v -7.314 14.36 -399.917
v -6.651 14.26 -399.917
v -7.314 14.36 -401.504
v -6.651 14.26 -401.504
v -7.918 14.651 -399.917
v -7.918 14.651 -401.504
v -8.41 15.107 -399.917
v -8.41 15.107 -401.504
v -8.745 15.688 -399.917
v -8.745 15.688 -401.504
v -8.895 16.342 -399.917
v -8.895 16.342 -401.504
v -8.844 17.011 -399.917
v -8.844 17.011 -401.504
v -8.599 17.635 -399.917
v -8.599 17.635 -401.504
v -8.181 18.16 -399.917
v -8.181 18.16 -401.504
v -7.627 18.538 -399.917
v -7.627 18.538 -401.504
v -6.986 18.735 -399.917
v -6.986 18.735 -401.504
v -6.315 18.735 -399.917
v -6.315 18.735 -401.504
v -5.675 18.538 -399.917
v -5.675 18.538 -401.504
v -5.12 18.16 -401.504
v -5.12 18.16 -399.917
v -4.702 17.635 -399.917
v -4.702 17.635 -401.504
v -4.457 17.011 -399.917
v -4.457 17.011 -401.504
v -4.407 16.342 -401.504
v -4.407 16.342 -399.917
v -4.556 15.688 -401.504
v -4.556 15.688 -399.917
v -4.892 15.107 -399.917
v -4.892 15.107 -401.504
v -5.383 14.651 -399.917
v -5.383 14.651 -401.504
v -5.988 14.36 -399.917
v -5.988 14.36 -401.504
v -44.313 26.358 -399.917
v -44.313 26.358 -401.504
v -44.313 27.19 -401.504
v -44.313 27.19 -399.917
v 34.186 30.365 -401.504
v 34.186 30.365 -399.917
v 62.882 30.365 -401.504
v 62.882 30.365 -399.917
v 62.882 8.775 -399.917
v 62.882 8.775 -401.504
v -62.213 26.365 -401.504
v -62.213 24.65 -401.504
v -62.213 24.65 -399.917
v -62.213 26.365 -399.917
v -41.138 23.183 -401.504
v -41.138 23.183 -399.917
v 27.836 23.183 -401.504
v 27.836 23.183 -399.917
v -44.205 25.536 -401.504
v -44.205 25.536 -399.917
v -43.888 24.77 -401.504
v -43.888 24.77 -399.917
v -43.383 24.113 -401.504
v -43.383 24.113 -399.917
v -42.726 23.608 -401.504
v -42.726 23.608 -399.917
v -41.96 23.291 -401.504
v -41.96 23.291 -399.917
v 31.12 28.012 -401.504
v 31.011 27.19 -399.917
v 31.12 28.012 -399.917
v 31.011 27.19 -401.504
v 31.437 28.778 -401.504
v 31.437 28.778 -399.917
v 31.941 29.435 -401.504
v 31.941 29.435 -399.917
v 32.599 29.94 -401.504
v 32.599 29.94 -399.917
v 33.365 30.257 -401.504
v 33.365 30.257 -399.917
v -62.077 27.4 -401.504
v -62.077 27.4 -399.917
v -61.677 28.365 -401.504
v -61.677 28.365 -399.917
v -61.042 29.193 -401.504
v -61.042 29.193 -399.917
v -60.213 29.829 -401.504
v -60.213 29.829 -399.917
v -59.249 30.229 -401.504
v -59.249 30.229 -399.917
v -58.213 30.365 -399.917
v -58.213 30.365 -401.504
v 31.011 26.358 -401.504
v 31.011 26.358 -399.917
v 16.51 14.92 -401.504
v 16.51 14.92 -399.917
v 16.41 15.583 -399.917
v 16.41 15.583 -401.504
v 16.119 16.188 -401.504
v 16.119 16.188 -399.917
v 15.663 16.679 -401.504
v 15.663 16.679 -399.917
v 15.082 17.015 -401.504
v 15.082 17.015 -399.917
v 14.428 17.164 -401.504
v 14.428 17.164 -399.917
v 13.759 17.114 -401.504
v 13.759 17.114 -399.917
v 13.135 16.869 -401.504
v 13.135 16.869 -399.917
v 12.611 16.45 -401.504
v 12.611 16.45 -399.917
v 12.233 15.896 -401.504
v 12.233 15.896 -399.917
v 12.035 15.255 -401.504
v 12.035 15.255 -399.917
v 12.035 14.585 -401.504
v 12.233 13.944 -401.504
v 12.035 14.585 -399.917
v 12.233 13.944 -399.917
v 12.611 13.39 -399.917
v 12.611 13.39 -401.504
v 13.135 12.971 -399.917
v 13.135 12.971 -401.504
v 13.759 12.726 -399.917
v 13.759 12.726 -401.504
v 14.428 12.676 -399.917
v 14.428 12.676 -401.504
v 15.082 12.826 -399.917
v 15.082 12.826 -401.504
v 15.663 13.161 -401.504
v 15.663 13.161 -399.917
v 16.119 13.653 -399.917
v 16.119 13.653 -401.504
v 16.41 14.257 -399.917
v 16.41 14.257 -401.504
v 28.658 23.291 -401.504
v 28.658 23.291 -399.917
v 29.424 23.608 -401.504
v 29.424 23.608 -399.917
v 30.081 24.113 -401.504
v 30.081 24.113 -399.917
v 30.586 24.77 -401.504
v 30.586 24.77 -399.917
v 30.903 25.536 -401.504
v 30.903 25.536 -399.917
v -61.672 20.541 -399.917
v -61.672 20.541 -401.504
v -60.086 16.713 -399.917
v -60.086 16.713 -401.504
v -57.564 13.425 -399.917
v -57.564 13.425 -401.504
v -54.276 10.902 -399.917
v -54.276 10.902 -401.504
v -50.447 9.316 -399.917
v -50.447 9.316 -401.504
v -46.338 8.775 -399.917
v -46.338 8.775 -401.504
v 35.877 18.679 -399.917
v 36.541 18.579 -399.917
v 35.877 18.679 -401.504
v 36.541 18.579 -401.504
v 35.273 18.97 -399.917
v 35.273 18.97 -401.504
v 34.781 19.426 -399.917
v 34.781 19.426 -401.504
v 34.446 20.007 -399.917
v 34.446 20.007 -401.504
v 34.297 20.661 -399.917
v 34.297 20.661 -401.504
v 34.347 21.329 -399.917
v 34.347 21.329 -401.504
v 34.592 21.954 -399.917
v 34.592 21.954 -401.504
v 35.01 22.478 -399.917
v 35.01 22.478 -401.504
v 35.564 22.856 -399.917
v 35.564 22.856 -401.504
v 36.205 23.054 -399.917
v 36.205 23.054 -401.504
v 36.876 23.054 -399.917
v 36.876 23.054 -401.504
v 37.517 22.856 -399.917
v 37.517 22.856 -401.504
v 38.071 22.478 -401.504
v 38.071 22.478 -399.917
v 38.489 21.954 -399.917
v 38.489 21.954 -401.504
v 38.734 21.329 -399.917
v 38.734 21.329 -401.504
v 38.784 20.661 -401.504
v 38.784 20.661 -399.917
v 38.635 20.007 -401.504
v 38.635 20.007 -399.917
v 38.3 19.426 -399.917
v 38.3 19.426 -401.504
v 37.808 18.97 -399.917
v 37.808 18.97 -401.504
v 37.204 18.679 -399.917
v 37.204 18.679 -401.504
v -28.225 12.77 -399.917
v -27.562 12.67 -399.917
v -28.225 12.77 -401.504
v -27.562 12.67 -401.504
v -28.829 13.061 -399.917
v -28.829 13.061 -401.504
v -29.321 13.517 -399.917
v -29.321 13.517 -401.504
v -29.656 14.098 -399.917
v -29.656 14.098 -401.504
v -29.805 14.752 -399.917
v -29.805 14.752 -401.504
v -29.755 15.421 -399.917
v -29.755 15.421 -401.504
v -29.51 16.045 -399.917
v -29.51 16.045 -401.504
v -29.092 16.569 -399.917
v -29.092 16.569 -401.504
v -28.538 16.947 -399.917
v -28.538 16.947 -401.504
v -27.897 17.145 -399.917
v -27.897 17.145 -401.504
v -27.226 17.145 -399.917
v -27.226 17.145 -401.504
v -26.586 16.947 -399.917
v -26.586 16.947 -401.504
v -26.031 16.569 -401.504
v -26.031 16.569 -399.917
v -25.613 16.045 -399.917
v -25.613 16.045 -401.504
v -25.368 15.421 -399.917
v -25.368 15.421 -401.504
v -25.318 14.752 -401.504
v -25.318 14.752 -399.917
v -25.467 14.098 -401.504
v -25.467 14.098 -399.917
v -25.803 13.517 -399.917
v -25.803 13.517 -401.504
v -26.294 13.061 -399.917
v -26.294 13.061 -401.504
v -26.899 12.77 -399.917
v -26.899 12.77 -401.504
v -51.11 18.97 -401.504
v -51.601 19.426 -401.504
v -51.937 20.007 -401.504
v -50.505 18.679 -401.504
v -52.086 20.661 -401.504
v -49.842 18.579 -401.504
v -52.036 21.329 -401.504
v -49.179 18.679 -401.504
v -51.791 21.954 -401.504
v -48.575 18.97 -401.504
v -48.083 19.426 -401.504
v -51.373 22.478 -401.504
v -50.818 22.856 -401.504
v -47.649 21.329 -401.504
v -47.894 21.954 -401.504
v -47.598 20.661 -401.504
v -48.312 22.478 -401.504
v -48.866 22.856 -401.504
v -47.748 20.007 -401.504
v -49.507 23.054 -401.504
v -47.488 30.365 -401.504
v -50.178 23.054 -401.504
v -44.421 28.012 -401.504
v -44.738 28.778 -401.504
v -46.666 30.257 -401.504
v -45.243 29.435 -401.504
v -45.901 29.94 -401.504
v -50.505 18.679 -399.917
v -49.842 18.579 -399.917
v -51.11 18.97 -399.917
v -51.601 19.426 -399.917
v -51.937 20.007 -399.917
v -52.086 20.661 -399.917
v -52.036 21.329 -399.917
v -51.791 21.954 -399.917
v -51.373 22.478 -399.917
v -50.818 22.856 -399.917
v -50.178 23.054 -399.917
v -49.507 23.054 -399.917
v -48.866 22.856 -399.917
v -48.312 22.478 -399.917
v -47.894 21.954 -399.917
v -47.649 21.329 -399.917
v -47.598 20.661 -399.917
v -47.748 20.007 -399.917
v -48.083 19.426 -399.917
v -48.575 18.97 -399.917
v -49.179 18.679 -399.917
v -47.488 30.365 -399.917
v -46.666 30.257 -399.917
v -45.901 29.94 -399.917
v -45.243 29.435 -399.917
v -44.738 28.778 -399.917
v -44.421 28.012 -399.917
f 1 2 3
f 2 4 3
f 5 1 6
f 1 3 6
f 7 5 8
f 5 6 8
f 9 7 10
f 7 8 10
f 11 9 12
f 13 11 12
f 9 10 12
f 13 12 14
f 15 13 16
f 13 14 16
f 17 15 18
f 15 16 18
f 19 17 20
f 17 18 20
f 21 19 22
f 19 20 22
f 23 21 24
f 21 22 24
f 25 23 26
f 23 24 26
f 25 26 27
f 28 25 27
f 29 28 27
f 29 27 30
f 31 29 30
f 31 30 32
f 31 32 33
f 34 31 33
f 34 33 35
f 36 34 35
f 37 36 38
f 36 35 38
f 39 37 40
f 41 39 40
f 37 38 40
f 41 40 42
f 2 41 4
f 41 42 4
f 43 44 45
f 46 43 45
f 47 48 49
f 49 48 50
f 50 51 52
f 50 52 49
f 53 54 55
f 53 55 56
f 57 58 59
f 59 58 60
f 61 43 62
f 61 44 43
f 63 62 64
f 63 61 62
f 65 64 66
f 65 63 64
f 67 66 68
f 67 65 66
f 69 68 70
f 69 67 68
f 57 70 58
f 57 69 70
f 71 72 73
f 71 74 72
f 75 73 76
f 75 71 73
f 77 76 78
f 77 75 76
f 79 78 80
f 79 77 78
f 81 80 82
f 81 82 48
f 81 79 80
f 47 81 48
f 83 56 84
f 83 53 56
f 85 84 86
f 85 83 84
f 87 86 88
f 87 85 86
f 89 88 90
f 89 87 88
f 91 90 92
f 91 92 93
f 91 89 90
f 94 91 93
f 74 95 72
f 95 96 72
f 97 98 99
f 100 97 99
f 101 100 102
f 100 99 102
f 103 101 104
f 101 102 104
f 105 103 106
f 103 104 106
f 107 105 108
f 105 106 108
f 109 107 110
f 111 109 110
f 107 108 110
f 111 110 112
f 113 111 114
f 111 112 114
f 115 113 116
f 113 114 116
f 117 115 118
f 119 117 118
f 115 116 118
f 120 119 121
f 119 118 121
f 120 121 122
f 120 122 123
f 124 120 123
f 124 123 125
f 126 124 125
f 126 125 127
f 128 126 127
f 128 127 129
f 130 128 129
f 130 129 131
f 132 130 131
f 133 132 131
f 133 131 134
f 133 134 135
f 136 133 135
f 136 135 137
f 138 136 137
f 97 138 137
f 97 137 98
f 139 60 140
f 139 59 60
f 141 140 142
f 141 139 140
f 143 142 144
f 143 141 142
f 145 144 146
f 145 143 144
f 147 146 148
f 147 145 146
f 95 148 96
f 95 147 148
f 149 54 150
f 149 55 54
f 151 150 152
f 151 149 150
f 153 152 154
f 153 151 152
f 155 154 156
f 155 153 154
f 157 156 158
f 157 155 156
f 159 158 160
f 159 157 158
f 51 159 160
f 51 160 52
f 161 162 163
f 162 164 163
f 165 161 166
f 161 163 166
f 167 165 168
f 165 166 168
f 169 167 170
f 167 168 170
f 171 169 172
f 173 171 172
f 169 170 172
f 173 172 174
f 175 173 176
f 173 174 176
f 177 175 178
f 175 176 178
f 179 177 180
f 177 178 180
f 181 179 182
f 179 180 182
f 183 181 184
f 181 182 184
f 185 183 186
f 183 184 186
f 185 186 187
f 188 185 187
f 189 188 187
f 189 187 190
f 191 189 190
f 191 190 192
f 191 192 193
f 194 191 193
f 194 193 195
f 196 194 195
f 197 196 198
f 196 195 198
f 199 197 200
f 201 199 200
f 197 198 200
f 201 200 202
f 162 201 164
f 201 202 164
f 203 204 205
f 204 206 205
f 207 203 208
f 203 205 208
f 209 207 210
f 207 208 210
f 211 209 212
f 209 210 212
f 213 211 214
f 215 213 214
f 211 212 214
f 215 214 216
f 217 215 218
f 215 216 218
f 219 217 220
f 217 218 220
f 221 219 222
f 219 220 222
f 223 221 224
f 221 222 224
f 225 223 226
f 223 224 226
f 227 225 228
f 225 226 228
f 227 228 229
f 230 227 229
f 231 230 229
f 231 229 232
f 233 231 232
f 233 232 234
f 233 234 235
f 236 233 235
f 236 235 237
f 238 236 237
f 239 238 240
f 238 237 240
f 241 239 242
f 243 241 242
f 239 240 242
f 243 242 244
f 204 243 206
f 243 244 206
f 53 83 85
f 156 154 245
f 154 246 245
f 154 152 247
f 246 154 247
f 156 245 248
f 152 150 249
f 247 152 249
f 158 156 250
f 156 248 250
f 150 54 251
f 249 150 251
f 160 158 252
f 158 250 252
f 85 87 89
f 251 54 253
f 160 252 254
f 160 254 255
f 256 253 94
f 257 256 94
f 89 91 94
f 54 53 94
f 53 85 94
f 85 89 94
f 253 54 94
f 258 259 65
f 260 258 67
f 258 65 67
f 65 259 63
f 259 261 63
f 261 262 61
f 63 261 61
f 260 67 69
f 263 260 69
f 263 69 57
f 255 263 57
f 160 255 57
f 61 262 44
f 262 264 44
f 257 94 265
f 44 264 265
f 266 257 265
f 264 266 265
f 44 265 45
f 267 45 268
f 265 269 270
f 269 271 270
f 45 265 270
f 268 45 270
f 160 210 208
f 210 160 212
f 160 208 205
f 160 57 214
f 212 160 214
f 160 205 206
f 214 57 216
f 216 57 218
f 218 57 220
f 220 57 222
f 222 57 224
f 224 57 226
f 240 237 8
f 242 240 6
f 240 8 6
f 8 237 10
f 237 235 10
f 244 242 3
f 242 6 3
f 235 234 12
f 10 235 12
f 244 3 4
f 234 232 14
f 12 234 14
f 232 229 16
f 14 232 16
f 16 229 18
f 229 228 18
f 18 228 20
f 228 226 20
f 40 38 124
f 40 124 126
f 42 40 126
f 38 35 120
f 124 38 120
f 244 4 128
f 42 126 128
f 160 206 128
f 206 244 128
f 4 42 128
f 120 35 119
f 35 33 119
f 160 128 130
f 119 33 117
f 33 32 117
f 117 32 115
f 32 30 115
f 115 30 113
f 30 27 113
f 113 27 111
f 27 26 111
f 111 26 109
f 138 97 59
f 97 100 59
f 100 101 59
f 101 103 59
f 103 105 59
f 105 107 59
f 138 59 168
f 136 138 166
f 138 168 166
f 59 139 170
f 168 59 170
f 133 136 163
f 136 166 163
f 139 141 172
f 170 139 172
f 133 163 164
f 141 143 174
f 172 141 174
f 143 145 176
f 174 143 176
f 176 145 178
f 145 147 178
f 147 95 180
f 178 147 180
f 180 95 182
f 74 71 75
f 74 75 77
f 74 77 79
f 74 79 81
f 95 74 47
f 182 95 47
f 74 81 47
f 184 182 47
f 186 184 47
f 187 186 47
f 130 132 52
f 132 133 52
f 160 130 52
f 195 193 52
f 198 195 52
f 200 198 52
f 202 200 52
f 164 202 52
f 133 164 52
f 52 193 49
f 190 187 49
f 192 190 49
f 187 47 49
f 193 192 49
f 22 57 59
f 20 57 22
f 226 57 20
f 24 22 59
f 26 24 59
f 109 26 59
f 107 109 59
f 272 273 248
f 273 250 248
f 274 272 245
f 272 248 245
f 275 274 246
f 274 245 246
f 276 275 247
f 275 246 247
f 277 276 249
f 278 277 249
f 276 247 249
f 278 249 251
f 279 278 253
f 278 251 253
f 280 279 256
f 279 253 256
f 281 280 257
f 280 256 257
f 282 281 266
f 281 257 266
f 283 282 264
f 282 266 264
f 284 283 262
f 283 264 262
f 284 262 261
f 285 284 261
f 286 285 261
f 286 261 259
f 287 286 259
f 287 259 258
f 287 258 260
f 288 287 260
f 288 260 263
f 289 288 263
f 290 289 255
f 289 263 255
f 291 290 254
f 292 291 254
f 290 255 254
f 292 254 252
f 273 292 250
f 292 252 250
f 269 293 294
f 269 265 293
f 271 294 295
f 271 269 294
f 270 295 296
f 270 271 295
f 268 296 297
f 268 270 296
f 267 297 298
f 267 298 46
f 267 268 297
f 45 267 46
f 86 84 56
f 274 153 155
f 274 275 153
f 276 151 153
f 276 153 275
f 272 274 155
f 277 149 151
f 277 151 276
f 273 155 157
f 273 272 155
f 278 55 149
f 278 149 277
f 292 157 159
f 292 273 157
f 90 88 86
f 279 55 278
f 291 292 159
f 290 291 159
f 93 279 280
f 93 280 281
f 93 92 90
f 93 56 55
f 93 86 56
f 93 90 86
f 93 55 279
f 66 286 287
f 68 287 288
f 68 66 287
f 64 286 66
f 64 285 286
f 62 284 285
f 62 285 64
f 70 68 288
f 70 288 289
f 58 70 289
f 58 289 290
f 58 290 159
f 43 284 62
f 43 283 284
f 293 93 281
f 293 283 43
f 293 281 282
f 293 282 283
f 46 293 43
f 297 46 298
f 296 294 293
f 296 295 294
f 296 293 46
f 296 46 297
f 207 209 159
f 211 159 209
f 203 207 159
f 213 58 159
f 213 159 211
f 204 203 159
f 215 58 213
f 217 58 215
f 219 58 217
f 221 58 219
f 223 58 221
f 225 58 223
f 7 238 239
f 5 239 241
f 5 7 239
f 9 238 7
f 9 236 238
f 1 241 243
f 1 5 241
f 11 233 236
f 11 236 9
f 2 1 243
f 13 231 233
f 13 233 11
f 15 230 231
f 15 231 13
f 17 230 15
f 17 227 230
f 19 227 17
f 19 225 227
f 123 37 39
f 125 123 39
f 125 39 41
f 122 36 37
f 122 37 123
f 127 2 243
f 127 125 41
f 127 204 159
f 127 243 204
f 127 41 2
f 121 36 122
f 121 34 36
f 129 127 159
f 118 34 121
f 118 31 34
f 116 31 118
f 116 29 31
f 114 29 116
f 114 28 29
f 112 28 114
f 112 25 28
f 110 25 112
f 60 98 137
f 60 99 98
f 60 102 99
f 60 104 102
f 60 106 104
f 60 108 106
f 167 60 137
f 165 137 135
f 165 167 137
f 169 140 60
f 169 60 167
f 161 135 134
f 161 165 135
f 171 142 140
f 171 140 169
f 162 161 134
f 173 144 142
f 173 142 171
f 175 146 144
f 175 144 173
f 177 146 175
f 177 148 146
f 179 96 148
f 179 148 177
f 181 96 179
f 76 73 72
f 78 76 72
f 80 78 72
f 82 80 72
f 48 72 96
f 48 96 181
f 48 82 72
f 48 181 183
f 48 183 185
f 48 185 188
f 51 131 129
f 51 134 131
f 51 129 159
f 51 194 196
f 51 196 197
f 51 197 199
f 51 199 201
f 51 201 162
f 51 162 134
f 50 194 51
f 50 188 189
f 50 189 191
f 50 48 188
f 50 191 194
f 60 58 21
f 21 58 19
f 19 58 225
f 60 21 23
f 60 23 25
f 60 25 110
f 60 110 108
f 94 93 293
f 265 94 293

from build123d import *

# Parameters (mm, degrees)
SKETCH2_W                     = 111.125
SKETCH2_H                     = 193.04
BOSS_EXTRUDE1_DEPTH           = 1.5875
FILLET1_R                     = 15.875
SKETCH6_R                     = 2.4003
SKETCH6_R_2                   = 3
SKETCH6_R_3                   = 6.477
SKETCH6_R_4                   = 10.762
CUT_EXTRUDE1_DEPTH            = 212.192646736
SKETCH7_W                     = 13.97
SKETCH7_H                     = 193.04
BOSS_EXTRUDE2_DEPTH           = 1.5875
SKETCH8_W                     = 75.32443897
SKETCH8_H                     = 38.1
SKETCH8_R                     = 10.762
SKETCH8_R_2                   = 3
SKETCH8_H_2                   = 31.75
SKETCH8_H_3                   = 34.487219484
SKETCH8_R_3                   = 2.4003
SKETCH8_R_4                   = 6.477
SKETCH8_R_5                   = 8.9535
CUT_EXTRUDE2_DEPTH            = 1.5875
FILLET2_R                     = 9.525
FILLET4_R                     = 9.525
SKETCH9_W                     = 125.095
SKETCH9_H                     = 149.86
CUT_EXTRUDE5_DEPTH            = 80
FILLET6_R                     = 4
FILLET10_R                    = 4
SKETCH4_W                     = 2.25
SKETCH4_H                     = 1.5875
M4_CLEARANCE_HOLE1_AT_2_COUNT = 2
M4_CLEARANCE_HOLE1_AT_2_PITCH = 43.406709572
M4_CLEARANCE_HOLE1_AT_3_COUNT = 2
M4_CLEARANCE_HOLE1_AT_3_PITCH = 86.3827405
M4_CLEARANCE_HOLE1_AT_4_COUNT = 2
M4_CLEARANCE_HOLE1_AT_4_PITCH = 189.737314909
M4_CLEARANCE_HOLE1_AT_5_COUNT = 2
M4_CLEARANCE_HOLE1_AT_5_PITCH = 178.553711266
M4_CLEARANCE_HOLE1_AT_6_COUNT = 2
M4_CLEARANCE_HOLE1_AT_6_PITCH = 168.9327405
M4_CLEARANCE_HOLE1_AT_7_COUNT = 2
M4_CLEARANCE_HOLE1_AT_7_PITCH = 23.050611575
M4_CLEARANCE_HOLE1_AT_8_COUNT = 2
M4_CLEARANCE_HOLE1_AT_8_PITCH = 186.221930585
SKETCH12_R                    = 2.25
SKETCH12_W                    = 69.5325
SKETCH12_H                    = 21.59
CUT_EXTRUDE6_DEPTH            = 212.39048994
SKETCH13_W                    = 75.32443897
SKETCH13_H                    = 3.175
CUT_EXTRUDE7_DEPTH            = 70.847408973
FILLET11_R                    = 3.175


with BuildPart() as part:
    # Sketch2 → Boss-Extrude1 (new body)
    # profile 1 of 2: a face of its own
    with BuildSketch(Plane.XY.offset(-401.504104662)):
        with Locations((-6.650833159, 105.295051609)):
            Rectangle(SKETCH2_W, SKETCH2_H)
        with BuildLine():
            ThreePointArc((40.429624387, 185.872334563), (40.429624387, 193.650509156), (32.651449794, 193.650509156))
            Line((32.651449794, 193.650509156), (29.670992248, 190.670051609))
            Line((29.670992248, 190.670051609), (-1.150833159, 190.670051609))
            Line((-1.150833159, 190.670051609), (-1.150833159, 194.079751609))
            ThreePointArc((-1.150833159, 194.079751609), (-6.650833159, 199.579751609), (-12.150833159, 194.079751609))
            Line((-12.150833159, 194.079751609), (-12.150833159, 190.670051609))
            Line((-12.150833159, 190.670051609), (-42.972658566, 190.670051609))
            Line((-42.972658566, 190.670051609), (-45.953116112, 193.650509156))
            ThreePointArc((-45.953116112, 193.650509156), (-53.731290705, 193.650509156), (-53.731290705, 185.872334563))
            Line((-53.731290705, 185.872334563), (-50.750833159, 182.891877016))
            Line((-50.750833159, 182.891877016), (-50.750833159, 138.989051609))
            Line((-50.750833159, 138.989051609), (-54.160533159, 138.989051609))
            ThreePointArc((-54.160533159, 138.989051609), (-59.660533159, 133.489051609), (-54.160533159, 127.989051609))
            Line((-54.160533159, 127.989051609), (-50.750833159, 127.989051609))
            Line((-50.750833159, 127.989051609), (-50.750833159, 82.601051609))
            Line((-50.750833159, 82.601051609), (-54.160533159, 82.601051609))
            ThreePointArc((-54.160533159, 82.601051609), (-59.660533159, 77.101051609), (-54.160533159, 71.601051609))
            Line((-54.160533159, 71.601051609), (-50.750833159, 71.601051609))
            Line((-50.750833159, 71.601051609), (-50.750833159, 27.698226203))
            Line((-50.750833159, 27.698226203), (-53.731290705, 24.717768656))
            ThreePointArc((-53.731290705, 24.717768656), (-53.731290705, 16.939594063), (-45.953116112, 16.939594063))
            Line((-45.953116112, 16.939594063), (-42.972658566, 19.920051609))
            Line((-42.972658566, 19.920051609), (-12.150833159, 19.920051609))
            Line((-12.150833159, 19.920051609), (-12.150833159, 16.510351609))
            ThreePointArc((-12.150833159, 16.510351609), (-6.650833159, 11.010351609), (-1.150833159, 16.510351609))
            Line((-1.150833159, 16.510351609), (-1.150833159, 19.920051609))
            Line((-1.150833159, 19.920051609), (29.670992248, 19.920051609))
            Line((29.670992248, 19.920051609), (32.651449794, 16.939594063))
            ThreePointArc((32.651449794, 16.939594063), (40.429624387, 16.939594063), (40.429624387, 24.717768656))
            Line((40.429624387, 24.717768656), (37.449166841, 27.698226203))
            Line((37.449166841, 27.698226203), (37.449166841, 71.601051609))
            Line((37.449166841, 71.601051609), (40.858866841, 71.601051609))
            ThreePointArc((40.858866841, 71.601051609), (46.358866841, 77.101051609), (40.858866841, 82.601051609))
            Line((40.858866841, 82.601051609), (37.449166841, 82.601051609))
            Line((37.449166841, 82.601051609), (37.449166841, 127.989051609))
            Line((37.449166841, 127.989051609), (40.858866841, 127.989051609))
            ThreePointArc((40.858866841, 127.989051609), (46.358866841, 133.489051609), (40.858866841, 138.989051609))
            Line((40.858866841, 138.989051609), (37.449166841, 138.989051609))
            Line((37.449166841, 138.989051609), (37.449166841, 182.891877016))
            Line((37.449166841, 182.891877016), (40.429624387, 185.872334563))
        make_face(mode=Mode.SUBTRACT)
    # profile 2 of 2: a face of its own
    with BuildSketch(Plane.XY.offset(-401.504104662)):
        with BuildLine():
            Line((37.449166841, 182.891877016), (40.429624387, 185.872334563))
            ThreePointArc((40.429624387, 185.872334563), (40.429624387, 193.650509156), (32.651449794, 193.650509156))
            Line((32.651449794, 193.650509156), (29.670992248, 190.670051609))
            Line((29.670992248, 190.670051609), (-1.150833159, 190.670051609))
            Line((-1.150833159, 190.670051609), (-1.150833159, 194.079751609))
            ThreePointArc((-1.150833159, 194.079751609), (-6.650833159, 199.579751609), (-12.150833159, 194.079751609))
            Line((-12.150833159, 194.079751609), (-12.150833159, 190.670051609))
            Line((-12.150833159, 190.670051609), (-42.972658566, 190.670051609))
            Line((-42.972658566, 190.670051609), (-45.953116112, 193.650509156))
            ThreePointArc((-45.953116112, 193.650509156), (-53.731290705, 193.650509156), (-53.731290705, 185.872334563))
            Line((-53.731290705, 185.872334563), (-50.750833159, 182.891877016))
            Line((-50.750833159, 182.891877016), (-50.750833159, 138.989051609))
            Line((-50.750833159, 138.989051609), (-54.160533159, 138.989051609))
            ThreePointArc((-54.160533159, 138.989051609), (-59.660533159, 133.489051609), (-54.160533159, 127.989051609))
            Line((-54.160533159, 127.989051609), (-50.750833159, 127.989051609))
            Line((-50.750833159, 127.989051609), (-50.750833159, 82.601051609))
            Line((-50.750833159, 82.601051609), (-54.160533159, 82.601051609))
            ThreePointArc((-54.160533159, 82.601051609), (-59.660533159, 77.101051609), (-54.160533159, 71.601051609))
            Line((-54.160533159, 71.601051609), (-50.750833159, 71.601051609))
            Line((-50.750833159, 71.601051609), (-50.750833159, 27.698226203))
            Line((-50.750833159, 27.698226203), (-53.731290705, 24.717768656))
            ThreePointArc((-53.731290705, 24.717768656), (-53.731290705, 16.939594063), (-45.953116112, 16.939594063))
            Line((-45.953116112, 16.939594063), (-42.972658566, 19.920051609))
            Line((-42.972658566, 19.920051609), (-12.150833159, 19.920051609))
            Line((-12.150833159, 19.920051609), (-12.150833159, 16.510351609))
            ThreePointArc((-12.150833159, 16.510351609), (-6.650833159, 11.010351609), (-1.150833159, 16.510351609))
            Line((-1.150833159, 16.510351609), (-1.150833159, 19.920051609))
            Line((-1.150833159, 19.920051609), (29.670992248, 19.920051609))
            Line((29.670992248, 19.920051609), (32.651449794, 16.939594063))
            ThreePointArc((32.651449794, 16.939594063), (40.429624387, 16.939594063), (40.429624387, 24.717768656))
            Line((40.429624387, 24.717768656), (37.449166841, 27.698226203))
            Line((37.449166841, 27.698226203), (37.449166841, 71.601051609))
            Line((37.449166841, 71.601051609), (40.858866841, 71.601051609))
            ThreePointArc((40.858866841, 71.601051609), (46.358866841, 77.101051609), (40.858866841, 82.601051609))
            Line((40.858866841, 82.601051609), (37.449166841, 82.601051609))
            Line((37.449166841, 82.601051609), (37.449166841, 127.989051609))
            Line((37.449166841, 127.989051609), (40.858866841, 127.989051609))
            ThreePointArc((40.858866841, 127.989051609), (46.358866841, 133.489051609), (40.858866841, 138.989051609))
            Line((40.858866841, 138.989051609), (37.449166841, 138.989051609))
            Line((37.449166841, 138.989051609), (37.449166841, 182.891877016))
        make_face()
    extrude(amount=BOSS_EXTRUDE1_DEPTH)

    # Fillet1
    fillet1_edges = [part.edges().sort_by_distance(p)[0] for p in [
        (-62.213333159, 201.815051609, -400.710354662),
        (-62.213333159, 8.775051609, -400.710354662),
    ]]
    fillet(fillet1_edges, radius=FILLET1_R)

    # Sketch6 → Cut-Extrude1 (cut, through all)
    with BuildSketch(Plane.XY.offset(-399.916604662)):
        with Locations((-34.590833159, 43.382551609)):
            Circle(SKETCH6_R)
        with Locations((21.289166841, 43.382551609)):
            Circle(SKETCH6_R)
        with Locations((-20.884724927, 142.590766631)):
            Circle(SKETCH6_R_2)
        with Locations((7.583058609, 166.225175879)):
            Circle(SKETCH6_R_2)
        with Locations((3.509166841, 43.382551609)):
            Circle(SKETCH6_R_3)
        with Locations((-16.810833159, 43.382551609)):
            Circle(SKETCH6_R_3)
        with Locations((-33.320833159, 123.670051609)):
            Circle(SKETCH6_R_3)
        with Locations((-6.650833159, 154.407971255)):
            Circle(SKETCH6_R_4)
        with Locations((-6.650833159, 94.607131964)):
            Circle(SKETCH6_R_4)
    extrude(amount=-CUT_EXTRUDE1_DEPTH, mode=Mode.SUBTRACT)

    # Sketch7 → Boss-Extrude2 (add)
    with BuildSketch(Plane.XY.offset(-399.916604662)):
        with Locations((55.896666841, 105.295051609)):
            Rectangle(SKETCH7_W, SKETCH7_H)
    extrude(amount=-BOSS_EXTRUDE2_DEPTH)

    # Sketch8 → Cut-Extrude2 (cut)
    # profile 1 of 4: a face of its own
    with BuildSketch(Plane.XY.offset(-399.916604662)):
        with Locations((-6.650833159, 154.407971255)):
            Rectangle(SKETCH8_W, SKETCH8_H)
        with Locations((-6.650833159, 154.407971255)):
            Circle(SKETCH8_R, mode=Mode.SUBTRACT)
        with Locations((7.583058609, 166.225175879)):
            Circle(SKETCH8_R_2, mode=Mode.SUBTRACT)
        with Locations((-20.884724927, 142.590766631)):
            Circle(SKETCH8_R_2, mode=Mode.SUBTRACT)
    # profile 2 of 4: a face of its own
    with BuildSketch(Plane.XY.offset(-399.916604662)):
        with Locations((-6.650833159, 94.607131964)):
            Rectangle(SKETCH8_W, SKETCH8_H_2)
        with Locations((-6.650833159, 94.607131964)):
            Circle(SKETCH8_R, mode=Mode.SUBTRACT)
    # profile 3 of 4: a face of its own
    with BuildSketch(Plane.XY.offset(-399.916604662)):
        with Locations((-6.650833159, 43.601441867)):
            Rectangle(SKETCH8_W, SKETCH8_H_3)
        with Locations((-34.590833159, 43.382551609)):
            Circle(SKETCH8_R_3, mode=Mode.SUBTRACT)
        with Locations((-16.810833159, 43.382551609)):
            Circle(SKETCH8_R_4, mode=Mode.SUBTRACT)
        with Locations((3.509166841, 43.382551609)):
            Circle(SKETCH8_R_4, mode=Mode.SUBTRACT)
        with Locations((21.289166841, 43.382551609)):
            Circle(SKETCH8_R_3, mode=Mode.SUBTRACT)
    # profile 4 of 4: a face of its own
    with BuildSketch(Plane.XY.offset(-399.916604662)):
        with Locations((-33.320833159, 123.670051609)):
            Circle(SKETCH8_R_5)
        with Locations((-33.320833159, 123.670051609)):
            Circle(SKETCH8_R_4, mode=Mode.SUBTRACT)
    extrude(amount=-CUT_EXTRUDE2_DEPTH, mode=Mode.SUBTRACT)

    # Fillet2
    fillet2_edges = [part.edges().sort_by_distance(p)[0] for p in [
        (31.011386326, 135.357971255, -400.710354662),
        (-44.313052644, 135.357971255, -400.710354662),
        (-44.313052644, 173.457971255, -400.710354662),
        (31.011386326, 173.457971255, -400.710354662),
    ]]
    fillet(fillet2_edges, radius=FILLET2_R)

    # Fillet4
    fillet4_edges = [part.edges().sort_by_distance(p)[0] for p in [
        (31.011386326, 110.482131964, -400.710354662),
        (31.011386326, 78.732131964, -400.710354662),
        (-44.313052644, 78.732131964, -400.710354662),
        (-44.313052644, 110.482131964, -400.710354662),
    ]]
    fillet(fillet4_edges, radius=FILLET4_R)

    # Sketch9 → Cut-Extrude5 (cut)
    with BuildSketch(Plane.XY.offset(-399.916604662)):
        with Locations((0.334166841, 105.295051609)):
            Rectangle(SKETCH9_W, SKETCH9_H)
    extrude(amount=-CUT_EXTRUDE5_DEPTH, mode=Mode.SUBTRACT)


with BuildPart() as cut_extrude5_piece_1:
    # of the separate pieces the step leaves, piece 1, a body of its own (cut_extrude5_pieces)
    add(part.part.solids().sort_by_distance((62.881666841, 180.225051609, -401.504104662))[0])

    # Fillet10
    fillet10_edges = [cut_extrude5_piece_1.edges().sort_by_distance(p)[0] for p in [
        (-62.213333159, 180.225051609, -400.710354662),
    ]]
    fillet(fillet10_edges, radius=FILLET10_R)

    # Sketch4 → M4 Clearance Hole1 (revolve, cut)
    with BuildSketch(Plane(origin=(36.540537091, 189.761421859, -399.916604662), x_dir=(0, -1, 0), z_dir=(1, 0, 0))):
        with Locations((1.125, 0.79375)):
            Rectangle(SKETCH4_W, SKETCH4_H)
    m4_clearance_hole1 = revolve(axis=Axis((36.540537091, 189.761421859, -393.566604662), (0, 0, -1)), mode=Mode.SUBTRACT)

    # M4 Clearance Hole1 at 2: M4 Clearance Hole1 ×2
    with Locations(*[Vector(-0.9950390314183887, 0.09948530521617187, 0) * (i * M4_CLEARANCE_HOLE1_AT_2_PITCH) for i in range(1, M4_CLEARANCE_HOLE1_AT_2_COUNT)]):
        add(m4_clearance_hole1, mode=Mode.SUBTRACT)

    # M4 Clearance Hole1 at 3: M4 Clearance Hole1 ×2
    with Locations(*[(-i * M4_CLEARANCE_HOLE1_AT_3_PITCH, 0, 0) for i in range(1, M4_CLEARANCE_HOLE1_AT_3_COUNT)]):
        add(m4_clearance_hole1, mode=Mode.SUBTRACT)

    # M4 Clearance Hole1 at 7: M4 Clearance Hole1 ×2
    with Locations(*[Vector(-0.9665885641891935, 0.25633288430997997, 0) * (i * M4_CLEARANCE_HOLE1_AT_7_PITCH) for i in range(1, M4_CLEARANCE_HOLE1_AT_7_COUNT)]):
        add(m4_clearance_hole1, mode=Mode.SUBTRACT)


with BuildPart() as cut_extrude5_piece_2:
    # of the separate pieces the step leaves, piece 2, a body of its own (cut_extrude5_pieces)
    add(part.part.solids().sort_by_distance((-62.213333159, 24.650051609, -401.504104662))[0])

    # Fillet6
    fillet6_edges = [cut_extrude5_piece_2.edges().sort_by_distance(p)[0] for p in [
        (-62.213333159, 30.365051609, -400.710354662),
    ]]
    fillet(fillet6_edges, radius=FILLET6_R)

    # M4 Clearance Hole1 at 4: M4 Clearance Hole1 ×2
    with Locations(*[Vector(-0.45527544511186635, -0.890350643891603, 0) * (i * M4_CLEARANCE_HOLE1_AT_4_PITCH) for i in range(1, M4_CLEARANCE_HOLE1_AT_4_COUNT)]):
        add(m4_clearance_hole1, mode=Mode.SUBTRACT)

    # M4 Clearance Hole1 at 5: M4 Clearance Hole1 ×2
    with Locations(*[Vector(-0.24189567354056962, -0.970302263793275, 0) * (i * M4_CLEARANCE_HOLE1_AT_5_PITCH) for i in range(1, M4_CLEARANCE_HOLE1_AT_5_COUNT)]):
        add(m4_clearance_hole1, mode=Mode.SUBTRACT)

    # M4 Clearance Hole1 at 6: M4 Clearance Hole1 ×2
    with Locations(*[(0, -i * M4_CLEARANCE_HOLE1_AT_6_PITCH, 0) for i in range(1, M4_CLEARANCE_HOLE1_AT_6_COUNT)]):
        add(m4_clearance_hole1, mode=Mode.SUBTRACT)

    # M4 Clearance Hole1 at 8: M4 Clearance Hole1 ×2
    with Locations(*[Vector(-0.34422520887864616, -0.9388871101322313, 0) * (i * M4_CLEARANCE_HOLE1_AT_8_PITCH) for i in range(1, M4_CLEARANCE_HOLE1_AT_8_COUNT)]):
        add(m4_clearance_hole1, mode=Mode.SUBTRACT)


with BuildPart() as cut_extrude6_tool:
    # Sketch12 → Cut-Extrude6 (new, through all)
    # profile 1 of 5: a face of its own
    with BuildSketch(Plane.XY.offset(-399.916604662)):
        with BuildLine():
            Line((-6.650833159, 180.225051609), (-6.650833159, 201.815051609))
            Line((-6.650833159, 201.815051609), (-46.338333159, 201.815051609))
            ThreePointArc((-46.338333159, 201.815051609), (-57.56365331, 197.165371761), (-62.213333159, 185.940051609))
            Line((-62.213333159, 185.940051609), (-62.213333159, 184.225051609))
            ThreePointArc((-62.213333159, 184.225051609), (-61.041760284, 181.396624485), (-58.213333159, 180.225051609))
            Line((-58.213333159, 180.225051609), (-6.650833159, 180.225051609))
        make_face()
        with Locations((-27.561745863, 195.670051609)):
            Circle(SKETCH12_R, mode=Mode.SUBTRACT)
    # profile 2 of 5: a face of its own
    with BuildSketch(Plane.XY.offset(-399.916604662)):
        with Locations((-27.561745863, 195.670051609)):
            Circle(SKETCH12_R)
    # profile 3 of 5: a face of its own
    with BuildSketch(Plane.XY.offset(-399.916604662)):
        with Locations((28.115416841, 191.020051609)):
            Rectangle(SKETCH12_W, SKETCH12_H)
        with Locations((14.260079544, 195.670051609)):
            Circle(SKETCH12_R, mode=Mode.SUBTRACT)
    # profile 4 of 5: a face of its own
    with BuildSketch(Plane.XY.offset(-399.916604662)):
        with Locations((14.260079544, 195.670051609)):
            Circle(SKETCH12_R)
    # profile 5 of 5: a face of its own
    with BuildSketch(Plane.XY.offset(-399.916604662)):
        with Locations((14.260079544, 14.920051609)):
            Circle(SKETCH12_R)
    extrude(amount=-CUT_EXTRUDE6_DEPTH)


with BuildPart() as cut_extrude5_piece_1_1:
    add(cut_extrude5_piece_1.part)

    # Cut-Extrude6: cut by cut_extrude6_tool
    add(cut_extrude6_tool.part, mode=Mode.SUBTRACT)


with BuildPart() as cut_extrude5_piece_2_1:
    add(cut_extrude5_piece_2.part)

    # Cut-Extrude6: cut by cut_extrude6_tool
    add(cut_extrude6_tool.part, mode=Mode.SUBTRACT)

    # Sketch13 → Cut-Extrude7 (cut, through all)
    with BuildSketch(Plane.XY.offset(-399.916604662)):
        with Locations((-6.650833159, 24.770332125)):
            Rectangle(SKETCH13_W, SKETCH13_H)
    extrude(amount=-CUT_EXTRUDE7_DEPTH, mode=Mode.SUBTRACT)

    # Fillet11
    fillet11_edges = [cut_extrude5_piece_2_1.edges().sort_by_distance(p)[0] for p in [
        (-44.313052644, 30.365051609, -400.710354662),
        (31.011386326, 30.365051609, -400.710354662),
        (-44.313052644, 23.182832125, -400.710354662),
        (31.011386326, 23.182832125, -400.710354662),
    ]]
    fillet(fillet11_edges, radius=FILLET11_R)


solid = cut_extrude5_piece_2_1.part
